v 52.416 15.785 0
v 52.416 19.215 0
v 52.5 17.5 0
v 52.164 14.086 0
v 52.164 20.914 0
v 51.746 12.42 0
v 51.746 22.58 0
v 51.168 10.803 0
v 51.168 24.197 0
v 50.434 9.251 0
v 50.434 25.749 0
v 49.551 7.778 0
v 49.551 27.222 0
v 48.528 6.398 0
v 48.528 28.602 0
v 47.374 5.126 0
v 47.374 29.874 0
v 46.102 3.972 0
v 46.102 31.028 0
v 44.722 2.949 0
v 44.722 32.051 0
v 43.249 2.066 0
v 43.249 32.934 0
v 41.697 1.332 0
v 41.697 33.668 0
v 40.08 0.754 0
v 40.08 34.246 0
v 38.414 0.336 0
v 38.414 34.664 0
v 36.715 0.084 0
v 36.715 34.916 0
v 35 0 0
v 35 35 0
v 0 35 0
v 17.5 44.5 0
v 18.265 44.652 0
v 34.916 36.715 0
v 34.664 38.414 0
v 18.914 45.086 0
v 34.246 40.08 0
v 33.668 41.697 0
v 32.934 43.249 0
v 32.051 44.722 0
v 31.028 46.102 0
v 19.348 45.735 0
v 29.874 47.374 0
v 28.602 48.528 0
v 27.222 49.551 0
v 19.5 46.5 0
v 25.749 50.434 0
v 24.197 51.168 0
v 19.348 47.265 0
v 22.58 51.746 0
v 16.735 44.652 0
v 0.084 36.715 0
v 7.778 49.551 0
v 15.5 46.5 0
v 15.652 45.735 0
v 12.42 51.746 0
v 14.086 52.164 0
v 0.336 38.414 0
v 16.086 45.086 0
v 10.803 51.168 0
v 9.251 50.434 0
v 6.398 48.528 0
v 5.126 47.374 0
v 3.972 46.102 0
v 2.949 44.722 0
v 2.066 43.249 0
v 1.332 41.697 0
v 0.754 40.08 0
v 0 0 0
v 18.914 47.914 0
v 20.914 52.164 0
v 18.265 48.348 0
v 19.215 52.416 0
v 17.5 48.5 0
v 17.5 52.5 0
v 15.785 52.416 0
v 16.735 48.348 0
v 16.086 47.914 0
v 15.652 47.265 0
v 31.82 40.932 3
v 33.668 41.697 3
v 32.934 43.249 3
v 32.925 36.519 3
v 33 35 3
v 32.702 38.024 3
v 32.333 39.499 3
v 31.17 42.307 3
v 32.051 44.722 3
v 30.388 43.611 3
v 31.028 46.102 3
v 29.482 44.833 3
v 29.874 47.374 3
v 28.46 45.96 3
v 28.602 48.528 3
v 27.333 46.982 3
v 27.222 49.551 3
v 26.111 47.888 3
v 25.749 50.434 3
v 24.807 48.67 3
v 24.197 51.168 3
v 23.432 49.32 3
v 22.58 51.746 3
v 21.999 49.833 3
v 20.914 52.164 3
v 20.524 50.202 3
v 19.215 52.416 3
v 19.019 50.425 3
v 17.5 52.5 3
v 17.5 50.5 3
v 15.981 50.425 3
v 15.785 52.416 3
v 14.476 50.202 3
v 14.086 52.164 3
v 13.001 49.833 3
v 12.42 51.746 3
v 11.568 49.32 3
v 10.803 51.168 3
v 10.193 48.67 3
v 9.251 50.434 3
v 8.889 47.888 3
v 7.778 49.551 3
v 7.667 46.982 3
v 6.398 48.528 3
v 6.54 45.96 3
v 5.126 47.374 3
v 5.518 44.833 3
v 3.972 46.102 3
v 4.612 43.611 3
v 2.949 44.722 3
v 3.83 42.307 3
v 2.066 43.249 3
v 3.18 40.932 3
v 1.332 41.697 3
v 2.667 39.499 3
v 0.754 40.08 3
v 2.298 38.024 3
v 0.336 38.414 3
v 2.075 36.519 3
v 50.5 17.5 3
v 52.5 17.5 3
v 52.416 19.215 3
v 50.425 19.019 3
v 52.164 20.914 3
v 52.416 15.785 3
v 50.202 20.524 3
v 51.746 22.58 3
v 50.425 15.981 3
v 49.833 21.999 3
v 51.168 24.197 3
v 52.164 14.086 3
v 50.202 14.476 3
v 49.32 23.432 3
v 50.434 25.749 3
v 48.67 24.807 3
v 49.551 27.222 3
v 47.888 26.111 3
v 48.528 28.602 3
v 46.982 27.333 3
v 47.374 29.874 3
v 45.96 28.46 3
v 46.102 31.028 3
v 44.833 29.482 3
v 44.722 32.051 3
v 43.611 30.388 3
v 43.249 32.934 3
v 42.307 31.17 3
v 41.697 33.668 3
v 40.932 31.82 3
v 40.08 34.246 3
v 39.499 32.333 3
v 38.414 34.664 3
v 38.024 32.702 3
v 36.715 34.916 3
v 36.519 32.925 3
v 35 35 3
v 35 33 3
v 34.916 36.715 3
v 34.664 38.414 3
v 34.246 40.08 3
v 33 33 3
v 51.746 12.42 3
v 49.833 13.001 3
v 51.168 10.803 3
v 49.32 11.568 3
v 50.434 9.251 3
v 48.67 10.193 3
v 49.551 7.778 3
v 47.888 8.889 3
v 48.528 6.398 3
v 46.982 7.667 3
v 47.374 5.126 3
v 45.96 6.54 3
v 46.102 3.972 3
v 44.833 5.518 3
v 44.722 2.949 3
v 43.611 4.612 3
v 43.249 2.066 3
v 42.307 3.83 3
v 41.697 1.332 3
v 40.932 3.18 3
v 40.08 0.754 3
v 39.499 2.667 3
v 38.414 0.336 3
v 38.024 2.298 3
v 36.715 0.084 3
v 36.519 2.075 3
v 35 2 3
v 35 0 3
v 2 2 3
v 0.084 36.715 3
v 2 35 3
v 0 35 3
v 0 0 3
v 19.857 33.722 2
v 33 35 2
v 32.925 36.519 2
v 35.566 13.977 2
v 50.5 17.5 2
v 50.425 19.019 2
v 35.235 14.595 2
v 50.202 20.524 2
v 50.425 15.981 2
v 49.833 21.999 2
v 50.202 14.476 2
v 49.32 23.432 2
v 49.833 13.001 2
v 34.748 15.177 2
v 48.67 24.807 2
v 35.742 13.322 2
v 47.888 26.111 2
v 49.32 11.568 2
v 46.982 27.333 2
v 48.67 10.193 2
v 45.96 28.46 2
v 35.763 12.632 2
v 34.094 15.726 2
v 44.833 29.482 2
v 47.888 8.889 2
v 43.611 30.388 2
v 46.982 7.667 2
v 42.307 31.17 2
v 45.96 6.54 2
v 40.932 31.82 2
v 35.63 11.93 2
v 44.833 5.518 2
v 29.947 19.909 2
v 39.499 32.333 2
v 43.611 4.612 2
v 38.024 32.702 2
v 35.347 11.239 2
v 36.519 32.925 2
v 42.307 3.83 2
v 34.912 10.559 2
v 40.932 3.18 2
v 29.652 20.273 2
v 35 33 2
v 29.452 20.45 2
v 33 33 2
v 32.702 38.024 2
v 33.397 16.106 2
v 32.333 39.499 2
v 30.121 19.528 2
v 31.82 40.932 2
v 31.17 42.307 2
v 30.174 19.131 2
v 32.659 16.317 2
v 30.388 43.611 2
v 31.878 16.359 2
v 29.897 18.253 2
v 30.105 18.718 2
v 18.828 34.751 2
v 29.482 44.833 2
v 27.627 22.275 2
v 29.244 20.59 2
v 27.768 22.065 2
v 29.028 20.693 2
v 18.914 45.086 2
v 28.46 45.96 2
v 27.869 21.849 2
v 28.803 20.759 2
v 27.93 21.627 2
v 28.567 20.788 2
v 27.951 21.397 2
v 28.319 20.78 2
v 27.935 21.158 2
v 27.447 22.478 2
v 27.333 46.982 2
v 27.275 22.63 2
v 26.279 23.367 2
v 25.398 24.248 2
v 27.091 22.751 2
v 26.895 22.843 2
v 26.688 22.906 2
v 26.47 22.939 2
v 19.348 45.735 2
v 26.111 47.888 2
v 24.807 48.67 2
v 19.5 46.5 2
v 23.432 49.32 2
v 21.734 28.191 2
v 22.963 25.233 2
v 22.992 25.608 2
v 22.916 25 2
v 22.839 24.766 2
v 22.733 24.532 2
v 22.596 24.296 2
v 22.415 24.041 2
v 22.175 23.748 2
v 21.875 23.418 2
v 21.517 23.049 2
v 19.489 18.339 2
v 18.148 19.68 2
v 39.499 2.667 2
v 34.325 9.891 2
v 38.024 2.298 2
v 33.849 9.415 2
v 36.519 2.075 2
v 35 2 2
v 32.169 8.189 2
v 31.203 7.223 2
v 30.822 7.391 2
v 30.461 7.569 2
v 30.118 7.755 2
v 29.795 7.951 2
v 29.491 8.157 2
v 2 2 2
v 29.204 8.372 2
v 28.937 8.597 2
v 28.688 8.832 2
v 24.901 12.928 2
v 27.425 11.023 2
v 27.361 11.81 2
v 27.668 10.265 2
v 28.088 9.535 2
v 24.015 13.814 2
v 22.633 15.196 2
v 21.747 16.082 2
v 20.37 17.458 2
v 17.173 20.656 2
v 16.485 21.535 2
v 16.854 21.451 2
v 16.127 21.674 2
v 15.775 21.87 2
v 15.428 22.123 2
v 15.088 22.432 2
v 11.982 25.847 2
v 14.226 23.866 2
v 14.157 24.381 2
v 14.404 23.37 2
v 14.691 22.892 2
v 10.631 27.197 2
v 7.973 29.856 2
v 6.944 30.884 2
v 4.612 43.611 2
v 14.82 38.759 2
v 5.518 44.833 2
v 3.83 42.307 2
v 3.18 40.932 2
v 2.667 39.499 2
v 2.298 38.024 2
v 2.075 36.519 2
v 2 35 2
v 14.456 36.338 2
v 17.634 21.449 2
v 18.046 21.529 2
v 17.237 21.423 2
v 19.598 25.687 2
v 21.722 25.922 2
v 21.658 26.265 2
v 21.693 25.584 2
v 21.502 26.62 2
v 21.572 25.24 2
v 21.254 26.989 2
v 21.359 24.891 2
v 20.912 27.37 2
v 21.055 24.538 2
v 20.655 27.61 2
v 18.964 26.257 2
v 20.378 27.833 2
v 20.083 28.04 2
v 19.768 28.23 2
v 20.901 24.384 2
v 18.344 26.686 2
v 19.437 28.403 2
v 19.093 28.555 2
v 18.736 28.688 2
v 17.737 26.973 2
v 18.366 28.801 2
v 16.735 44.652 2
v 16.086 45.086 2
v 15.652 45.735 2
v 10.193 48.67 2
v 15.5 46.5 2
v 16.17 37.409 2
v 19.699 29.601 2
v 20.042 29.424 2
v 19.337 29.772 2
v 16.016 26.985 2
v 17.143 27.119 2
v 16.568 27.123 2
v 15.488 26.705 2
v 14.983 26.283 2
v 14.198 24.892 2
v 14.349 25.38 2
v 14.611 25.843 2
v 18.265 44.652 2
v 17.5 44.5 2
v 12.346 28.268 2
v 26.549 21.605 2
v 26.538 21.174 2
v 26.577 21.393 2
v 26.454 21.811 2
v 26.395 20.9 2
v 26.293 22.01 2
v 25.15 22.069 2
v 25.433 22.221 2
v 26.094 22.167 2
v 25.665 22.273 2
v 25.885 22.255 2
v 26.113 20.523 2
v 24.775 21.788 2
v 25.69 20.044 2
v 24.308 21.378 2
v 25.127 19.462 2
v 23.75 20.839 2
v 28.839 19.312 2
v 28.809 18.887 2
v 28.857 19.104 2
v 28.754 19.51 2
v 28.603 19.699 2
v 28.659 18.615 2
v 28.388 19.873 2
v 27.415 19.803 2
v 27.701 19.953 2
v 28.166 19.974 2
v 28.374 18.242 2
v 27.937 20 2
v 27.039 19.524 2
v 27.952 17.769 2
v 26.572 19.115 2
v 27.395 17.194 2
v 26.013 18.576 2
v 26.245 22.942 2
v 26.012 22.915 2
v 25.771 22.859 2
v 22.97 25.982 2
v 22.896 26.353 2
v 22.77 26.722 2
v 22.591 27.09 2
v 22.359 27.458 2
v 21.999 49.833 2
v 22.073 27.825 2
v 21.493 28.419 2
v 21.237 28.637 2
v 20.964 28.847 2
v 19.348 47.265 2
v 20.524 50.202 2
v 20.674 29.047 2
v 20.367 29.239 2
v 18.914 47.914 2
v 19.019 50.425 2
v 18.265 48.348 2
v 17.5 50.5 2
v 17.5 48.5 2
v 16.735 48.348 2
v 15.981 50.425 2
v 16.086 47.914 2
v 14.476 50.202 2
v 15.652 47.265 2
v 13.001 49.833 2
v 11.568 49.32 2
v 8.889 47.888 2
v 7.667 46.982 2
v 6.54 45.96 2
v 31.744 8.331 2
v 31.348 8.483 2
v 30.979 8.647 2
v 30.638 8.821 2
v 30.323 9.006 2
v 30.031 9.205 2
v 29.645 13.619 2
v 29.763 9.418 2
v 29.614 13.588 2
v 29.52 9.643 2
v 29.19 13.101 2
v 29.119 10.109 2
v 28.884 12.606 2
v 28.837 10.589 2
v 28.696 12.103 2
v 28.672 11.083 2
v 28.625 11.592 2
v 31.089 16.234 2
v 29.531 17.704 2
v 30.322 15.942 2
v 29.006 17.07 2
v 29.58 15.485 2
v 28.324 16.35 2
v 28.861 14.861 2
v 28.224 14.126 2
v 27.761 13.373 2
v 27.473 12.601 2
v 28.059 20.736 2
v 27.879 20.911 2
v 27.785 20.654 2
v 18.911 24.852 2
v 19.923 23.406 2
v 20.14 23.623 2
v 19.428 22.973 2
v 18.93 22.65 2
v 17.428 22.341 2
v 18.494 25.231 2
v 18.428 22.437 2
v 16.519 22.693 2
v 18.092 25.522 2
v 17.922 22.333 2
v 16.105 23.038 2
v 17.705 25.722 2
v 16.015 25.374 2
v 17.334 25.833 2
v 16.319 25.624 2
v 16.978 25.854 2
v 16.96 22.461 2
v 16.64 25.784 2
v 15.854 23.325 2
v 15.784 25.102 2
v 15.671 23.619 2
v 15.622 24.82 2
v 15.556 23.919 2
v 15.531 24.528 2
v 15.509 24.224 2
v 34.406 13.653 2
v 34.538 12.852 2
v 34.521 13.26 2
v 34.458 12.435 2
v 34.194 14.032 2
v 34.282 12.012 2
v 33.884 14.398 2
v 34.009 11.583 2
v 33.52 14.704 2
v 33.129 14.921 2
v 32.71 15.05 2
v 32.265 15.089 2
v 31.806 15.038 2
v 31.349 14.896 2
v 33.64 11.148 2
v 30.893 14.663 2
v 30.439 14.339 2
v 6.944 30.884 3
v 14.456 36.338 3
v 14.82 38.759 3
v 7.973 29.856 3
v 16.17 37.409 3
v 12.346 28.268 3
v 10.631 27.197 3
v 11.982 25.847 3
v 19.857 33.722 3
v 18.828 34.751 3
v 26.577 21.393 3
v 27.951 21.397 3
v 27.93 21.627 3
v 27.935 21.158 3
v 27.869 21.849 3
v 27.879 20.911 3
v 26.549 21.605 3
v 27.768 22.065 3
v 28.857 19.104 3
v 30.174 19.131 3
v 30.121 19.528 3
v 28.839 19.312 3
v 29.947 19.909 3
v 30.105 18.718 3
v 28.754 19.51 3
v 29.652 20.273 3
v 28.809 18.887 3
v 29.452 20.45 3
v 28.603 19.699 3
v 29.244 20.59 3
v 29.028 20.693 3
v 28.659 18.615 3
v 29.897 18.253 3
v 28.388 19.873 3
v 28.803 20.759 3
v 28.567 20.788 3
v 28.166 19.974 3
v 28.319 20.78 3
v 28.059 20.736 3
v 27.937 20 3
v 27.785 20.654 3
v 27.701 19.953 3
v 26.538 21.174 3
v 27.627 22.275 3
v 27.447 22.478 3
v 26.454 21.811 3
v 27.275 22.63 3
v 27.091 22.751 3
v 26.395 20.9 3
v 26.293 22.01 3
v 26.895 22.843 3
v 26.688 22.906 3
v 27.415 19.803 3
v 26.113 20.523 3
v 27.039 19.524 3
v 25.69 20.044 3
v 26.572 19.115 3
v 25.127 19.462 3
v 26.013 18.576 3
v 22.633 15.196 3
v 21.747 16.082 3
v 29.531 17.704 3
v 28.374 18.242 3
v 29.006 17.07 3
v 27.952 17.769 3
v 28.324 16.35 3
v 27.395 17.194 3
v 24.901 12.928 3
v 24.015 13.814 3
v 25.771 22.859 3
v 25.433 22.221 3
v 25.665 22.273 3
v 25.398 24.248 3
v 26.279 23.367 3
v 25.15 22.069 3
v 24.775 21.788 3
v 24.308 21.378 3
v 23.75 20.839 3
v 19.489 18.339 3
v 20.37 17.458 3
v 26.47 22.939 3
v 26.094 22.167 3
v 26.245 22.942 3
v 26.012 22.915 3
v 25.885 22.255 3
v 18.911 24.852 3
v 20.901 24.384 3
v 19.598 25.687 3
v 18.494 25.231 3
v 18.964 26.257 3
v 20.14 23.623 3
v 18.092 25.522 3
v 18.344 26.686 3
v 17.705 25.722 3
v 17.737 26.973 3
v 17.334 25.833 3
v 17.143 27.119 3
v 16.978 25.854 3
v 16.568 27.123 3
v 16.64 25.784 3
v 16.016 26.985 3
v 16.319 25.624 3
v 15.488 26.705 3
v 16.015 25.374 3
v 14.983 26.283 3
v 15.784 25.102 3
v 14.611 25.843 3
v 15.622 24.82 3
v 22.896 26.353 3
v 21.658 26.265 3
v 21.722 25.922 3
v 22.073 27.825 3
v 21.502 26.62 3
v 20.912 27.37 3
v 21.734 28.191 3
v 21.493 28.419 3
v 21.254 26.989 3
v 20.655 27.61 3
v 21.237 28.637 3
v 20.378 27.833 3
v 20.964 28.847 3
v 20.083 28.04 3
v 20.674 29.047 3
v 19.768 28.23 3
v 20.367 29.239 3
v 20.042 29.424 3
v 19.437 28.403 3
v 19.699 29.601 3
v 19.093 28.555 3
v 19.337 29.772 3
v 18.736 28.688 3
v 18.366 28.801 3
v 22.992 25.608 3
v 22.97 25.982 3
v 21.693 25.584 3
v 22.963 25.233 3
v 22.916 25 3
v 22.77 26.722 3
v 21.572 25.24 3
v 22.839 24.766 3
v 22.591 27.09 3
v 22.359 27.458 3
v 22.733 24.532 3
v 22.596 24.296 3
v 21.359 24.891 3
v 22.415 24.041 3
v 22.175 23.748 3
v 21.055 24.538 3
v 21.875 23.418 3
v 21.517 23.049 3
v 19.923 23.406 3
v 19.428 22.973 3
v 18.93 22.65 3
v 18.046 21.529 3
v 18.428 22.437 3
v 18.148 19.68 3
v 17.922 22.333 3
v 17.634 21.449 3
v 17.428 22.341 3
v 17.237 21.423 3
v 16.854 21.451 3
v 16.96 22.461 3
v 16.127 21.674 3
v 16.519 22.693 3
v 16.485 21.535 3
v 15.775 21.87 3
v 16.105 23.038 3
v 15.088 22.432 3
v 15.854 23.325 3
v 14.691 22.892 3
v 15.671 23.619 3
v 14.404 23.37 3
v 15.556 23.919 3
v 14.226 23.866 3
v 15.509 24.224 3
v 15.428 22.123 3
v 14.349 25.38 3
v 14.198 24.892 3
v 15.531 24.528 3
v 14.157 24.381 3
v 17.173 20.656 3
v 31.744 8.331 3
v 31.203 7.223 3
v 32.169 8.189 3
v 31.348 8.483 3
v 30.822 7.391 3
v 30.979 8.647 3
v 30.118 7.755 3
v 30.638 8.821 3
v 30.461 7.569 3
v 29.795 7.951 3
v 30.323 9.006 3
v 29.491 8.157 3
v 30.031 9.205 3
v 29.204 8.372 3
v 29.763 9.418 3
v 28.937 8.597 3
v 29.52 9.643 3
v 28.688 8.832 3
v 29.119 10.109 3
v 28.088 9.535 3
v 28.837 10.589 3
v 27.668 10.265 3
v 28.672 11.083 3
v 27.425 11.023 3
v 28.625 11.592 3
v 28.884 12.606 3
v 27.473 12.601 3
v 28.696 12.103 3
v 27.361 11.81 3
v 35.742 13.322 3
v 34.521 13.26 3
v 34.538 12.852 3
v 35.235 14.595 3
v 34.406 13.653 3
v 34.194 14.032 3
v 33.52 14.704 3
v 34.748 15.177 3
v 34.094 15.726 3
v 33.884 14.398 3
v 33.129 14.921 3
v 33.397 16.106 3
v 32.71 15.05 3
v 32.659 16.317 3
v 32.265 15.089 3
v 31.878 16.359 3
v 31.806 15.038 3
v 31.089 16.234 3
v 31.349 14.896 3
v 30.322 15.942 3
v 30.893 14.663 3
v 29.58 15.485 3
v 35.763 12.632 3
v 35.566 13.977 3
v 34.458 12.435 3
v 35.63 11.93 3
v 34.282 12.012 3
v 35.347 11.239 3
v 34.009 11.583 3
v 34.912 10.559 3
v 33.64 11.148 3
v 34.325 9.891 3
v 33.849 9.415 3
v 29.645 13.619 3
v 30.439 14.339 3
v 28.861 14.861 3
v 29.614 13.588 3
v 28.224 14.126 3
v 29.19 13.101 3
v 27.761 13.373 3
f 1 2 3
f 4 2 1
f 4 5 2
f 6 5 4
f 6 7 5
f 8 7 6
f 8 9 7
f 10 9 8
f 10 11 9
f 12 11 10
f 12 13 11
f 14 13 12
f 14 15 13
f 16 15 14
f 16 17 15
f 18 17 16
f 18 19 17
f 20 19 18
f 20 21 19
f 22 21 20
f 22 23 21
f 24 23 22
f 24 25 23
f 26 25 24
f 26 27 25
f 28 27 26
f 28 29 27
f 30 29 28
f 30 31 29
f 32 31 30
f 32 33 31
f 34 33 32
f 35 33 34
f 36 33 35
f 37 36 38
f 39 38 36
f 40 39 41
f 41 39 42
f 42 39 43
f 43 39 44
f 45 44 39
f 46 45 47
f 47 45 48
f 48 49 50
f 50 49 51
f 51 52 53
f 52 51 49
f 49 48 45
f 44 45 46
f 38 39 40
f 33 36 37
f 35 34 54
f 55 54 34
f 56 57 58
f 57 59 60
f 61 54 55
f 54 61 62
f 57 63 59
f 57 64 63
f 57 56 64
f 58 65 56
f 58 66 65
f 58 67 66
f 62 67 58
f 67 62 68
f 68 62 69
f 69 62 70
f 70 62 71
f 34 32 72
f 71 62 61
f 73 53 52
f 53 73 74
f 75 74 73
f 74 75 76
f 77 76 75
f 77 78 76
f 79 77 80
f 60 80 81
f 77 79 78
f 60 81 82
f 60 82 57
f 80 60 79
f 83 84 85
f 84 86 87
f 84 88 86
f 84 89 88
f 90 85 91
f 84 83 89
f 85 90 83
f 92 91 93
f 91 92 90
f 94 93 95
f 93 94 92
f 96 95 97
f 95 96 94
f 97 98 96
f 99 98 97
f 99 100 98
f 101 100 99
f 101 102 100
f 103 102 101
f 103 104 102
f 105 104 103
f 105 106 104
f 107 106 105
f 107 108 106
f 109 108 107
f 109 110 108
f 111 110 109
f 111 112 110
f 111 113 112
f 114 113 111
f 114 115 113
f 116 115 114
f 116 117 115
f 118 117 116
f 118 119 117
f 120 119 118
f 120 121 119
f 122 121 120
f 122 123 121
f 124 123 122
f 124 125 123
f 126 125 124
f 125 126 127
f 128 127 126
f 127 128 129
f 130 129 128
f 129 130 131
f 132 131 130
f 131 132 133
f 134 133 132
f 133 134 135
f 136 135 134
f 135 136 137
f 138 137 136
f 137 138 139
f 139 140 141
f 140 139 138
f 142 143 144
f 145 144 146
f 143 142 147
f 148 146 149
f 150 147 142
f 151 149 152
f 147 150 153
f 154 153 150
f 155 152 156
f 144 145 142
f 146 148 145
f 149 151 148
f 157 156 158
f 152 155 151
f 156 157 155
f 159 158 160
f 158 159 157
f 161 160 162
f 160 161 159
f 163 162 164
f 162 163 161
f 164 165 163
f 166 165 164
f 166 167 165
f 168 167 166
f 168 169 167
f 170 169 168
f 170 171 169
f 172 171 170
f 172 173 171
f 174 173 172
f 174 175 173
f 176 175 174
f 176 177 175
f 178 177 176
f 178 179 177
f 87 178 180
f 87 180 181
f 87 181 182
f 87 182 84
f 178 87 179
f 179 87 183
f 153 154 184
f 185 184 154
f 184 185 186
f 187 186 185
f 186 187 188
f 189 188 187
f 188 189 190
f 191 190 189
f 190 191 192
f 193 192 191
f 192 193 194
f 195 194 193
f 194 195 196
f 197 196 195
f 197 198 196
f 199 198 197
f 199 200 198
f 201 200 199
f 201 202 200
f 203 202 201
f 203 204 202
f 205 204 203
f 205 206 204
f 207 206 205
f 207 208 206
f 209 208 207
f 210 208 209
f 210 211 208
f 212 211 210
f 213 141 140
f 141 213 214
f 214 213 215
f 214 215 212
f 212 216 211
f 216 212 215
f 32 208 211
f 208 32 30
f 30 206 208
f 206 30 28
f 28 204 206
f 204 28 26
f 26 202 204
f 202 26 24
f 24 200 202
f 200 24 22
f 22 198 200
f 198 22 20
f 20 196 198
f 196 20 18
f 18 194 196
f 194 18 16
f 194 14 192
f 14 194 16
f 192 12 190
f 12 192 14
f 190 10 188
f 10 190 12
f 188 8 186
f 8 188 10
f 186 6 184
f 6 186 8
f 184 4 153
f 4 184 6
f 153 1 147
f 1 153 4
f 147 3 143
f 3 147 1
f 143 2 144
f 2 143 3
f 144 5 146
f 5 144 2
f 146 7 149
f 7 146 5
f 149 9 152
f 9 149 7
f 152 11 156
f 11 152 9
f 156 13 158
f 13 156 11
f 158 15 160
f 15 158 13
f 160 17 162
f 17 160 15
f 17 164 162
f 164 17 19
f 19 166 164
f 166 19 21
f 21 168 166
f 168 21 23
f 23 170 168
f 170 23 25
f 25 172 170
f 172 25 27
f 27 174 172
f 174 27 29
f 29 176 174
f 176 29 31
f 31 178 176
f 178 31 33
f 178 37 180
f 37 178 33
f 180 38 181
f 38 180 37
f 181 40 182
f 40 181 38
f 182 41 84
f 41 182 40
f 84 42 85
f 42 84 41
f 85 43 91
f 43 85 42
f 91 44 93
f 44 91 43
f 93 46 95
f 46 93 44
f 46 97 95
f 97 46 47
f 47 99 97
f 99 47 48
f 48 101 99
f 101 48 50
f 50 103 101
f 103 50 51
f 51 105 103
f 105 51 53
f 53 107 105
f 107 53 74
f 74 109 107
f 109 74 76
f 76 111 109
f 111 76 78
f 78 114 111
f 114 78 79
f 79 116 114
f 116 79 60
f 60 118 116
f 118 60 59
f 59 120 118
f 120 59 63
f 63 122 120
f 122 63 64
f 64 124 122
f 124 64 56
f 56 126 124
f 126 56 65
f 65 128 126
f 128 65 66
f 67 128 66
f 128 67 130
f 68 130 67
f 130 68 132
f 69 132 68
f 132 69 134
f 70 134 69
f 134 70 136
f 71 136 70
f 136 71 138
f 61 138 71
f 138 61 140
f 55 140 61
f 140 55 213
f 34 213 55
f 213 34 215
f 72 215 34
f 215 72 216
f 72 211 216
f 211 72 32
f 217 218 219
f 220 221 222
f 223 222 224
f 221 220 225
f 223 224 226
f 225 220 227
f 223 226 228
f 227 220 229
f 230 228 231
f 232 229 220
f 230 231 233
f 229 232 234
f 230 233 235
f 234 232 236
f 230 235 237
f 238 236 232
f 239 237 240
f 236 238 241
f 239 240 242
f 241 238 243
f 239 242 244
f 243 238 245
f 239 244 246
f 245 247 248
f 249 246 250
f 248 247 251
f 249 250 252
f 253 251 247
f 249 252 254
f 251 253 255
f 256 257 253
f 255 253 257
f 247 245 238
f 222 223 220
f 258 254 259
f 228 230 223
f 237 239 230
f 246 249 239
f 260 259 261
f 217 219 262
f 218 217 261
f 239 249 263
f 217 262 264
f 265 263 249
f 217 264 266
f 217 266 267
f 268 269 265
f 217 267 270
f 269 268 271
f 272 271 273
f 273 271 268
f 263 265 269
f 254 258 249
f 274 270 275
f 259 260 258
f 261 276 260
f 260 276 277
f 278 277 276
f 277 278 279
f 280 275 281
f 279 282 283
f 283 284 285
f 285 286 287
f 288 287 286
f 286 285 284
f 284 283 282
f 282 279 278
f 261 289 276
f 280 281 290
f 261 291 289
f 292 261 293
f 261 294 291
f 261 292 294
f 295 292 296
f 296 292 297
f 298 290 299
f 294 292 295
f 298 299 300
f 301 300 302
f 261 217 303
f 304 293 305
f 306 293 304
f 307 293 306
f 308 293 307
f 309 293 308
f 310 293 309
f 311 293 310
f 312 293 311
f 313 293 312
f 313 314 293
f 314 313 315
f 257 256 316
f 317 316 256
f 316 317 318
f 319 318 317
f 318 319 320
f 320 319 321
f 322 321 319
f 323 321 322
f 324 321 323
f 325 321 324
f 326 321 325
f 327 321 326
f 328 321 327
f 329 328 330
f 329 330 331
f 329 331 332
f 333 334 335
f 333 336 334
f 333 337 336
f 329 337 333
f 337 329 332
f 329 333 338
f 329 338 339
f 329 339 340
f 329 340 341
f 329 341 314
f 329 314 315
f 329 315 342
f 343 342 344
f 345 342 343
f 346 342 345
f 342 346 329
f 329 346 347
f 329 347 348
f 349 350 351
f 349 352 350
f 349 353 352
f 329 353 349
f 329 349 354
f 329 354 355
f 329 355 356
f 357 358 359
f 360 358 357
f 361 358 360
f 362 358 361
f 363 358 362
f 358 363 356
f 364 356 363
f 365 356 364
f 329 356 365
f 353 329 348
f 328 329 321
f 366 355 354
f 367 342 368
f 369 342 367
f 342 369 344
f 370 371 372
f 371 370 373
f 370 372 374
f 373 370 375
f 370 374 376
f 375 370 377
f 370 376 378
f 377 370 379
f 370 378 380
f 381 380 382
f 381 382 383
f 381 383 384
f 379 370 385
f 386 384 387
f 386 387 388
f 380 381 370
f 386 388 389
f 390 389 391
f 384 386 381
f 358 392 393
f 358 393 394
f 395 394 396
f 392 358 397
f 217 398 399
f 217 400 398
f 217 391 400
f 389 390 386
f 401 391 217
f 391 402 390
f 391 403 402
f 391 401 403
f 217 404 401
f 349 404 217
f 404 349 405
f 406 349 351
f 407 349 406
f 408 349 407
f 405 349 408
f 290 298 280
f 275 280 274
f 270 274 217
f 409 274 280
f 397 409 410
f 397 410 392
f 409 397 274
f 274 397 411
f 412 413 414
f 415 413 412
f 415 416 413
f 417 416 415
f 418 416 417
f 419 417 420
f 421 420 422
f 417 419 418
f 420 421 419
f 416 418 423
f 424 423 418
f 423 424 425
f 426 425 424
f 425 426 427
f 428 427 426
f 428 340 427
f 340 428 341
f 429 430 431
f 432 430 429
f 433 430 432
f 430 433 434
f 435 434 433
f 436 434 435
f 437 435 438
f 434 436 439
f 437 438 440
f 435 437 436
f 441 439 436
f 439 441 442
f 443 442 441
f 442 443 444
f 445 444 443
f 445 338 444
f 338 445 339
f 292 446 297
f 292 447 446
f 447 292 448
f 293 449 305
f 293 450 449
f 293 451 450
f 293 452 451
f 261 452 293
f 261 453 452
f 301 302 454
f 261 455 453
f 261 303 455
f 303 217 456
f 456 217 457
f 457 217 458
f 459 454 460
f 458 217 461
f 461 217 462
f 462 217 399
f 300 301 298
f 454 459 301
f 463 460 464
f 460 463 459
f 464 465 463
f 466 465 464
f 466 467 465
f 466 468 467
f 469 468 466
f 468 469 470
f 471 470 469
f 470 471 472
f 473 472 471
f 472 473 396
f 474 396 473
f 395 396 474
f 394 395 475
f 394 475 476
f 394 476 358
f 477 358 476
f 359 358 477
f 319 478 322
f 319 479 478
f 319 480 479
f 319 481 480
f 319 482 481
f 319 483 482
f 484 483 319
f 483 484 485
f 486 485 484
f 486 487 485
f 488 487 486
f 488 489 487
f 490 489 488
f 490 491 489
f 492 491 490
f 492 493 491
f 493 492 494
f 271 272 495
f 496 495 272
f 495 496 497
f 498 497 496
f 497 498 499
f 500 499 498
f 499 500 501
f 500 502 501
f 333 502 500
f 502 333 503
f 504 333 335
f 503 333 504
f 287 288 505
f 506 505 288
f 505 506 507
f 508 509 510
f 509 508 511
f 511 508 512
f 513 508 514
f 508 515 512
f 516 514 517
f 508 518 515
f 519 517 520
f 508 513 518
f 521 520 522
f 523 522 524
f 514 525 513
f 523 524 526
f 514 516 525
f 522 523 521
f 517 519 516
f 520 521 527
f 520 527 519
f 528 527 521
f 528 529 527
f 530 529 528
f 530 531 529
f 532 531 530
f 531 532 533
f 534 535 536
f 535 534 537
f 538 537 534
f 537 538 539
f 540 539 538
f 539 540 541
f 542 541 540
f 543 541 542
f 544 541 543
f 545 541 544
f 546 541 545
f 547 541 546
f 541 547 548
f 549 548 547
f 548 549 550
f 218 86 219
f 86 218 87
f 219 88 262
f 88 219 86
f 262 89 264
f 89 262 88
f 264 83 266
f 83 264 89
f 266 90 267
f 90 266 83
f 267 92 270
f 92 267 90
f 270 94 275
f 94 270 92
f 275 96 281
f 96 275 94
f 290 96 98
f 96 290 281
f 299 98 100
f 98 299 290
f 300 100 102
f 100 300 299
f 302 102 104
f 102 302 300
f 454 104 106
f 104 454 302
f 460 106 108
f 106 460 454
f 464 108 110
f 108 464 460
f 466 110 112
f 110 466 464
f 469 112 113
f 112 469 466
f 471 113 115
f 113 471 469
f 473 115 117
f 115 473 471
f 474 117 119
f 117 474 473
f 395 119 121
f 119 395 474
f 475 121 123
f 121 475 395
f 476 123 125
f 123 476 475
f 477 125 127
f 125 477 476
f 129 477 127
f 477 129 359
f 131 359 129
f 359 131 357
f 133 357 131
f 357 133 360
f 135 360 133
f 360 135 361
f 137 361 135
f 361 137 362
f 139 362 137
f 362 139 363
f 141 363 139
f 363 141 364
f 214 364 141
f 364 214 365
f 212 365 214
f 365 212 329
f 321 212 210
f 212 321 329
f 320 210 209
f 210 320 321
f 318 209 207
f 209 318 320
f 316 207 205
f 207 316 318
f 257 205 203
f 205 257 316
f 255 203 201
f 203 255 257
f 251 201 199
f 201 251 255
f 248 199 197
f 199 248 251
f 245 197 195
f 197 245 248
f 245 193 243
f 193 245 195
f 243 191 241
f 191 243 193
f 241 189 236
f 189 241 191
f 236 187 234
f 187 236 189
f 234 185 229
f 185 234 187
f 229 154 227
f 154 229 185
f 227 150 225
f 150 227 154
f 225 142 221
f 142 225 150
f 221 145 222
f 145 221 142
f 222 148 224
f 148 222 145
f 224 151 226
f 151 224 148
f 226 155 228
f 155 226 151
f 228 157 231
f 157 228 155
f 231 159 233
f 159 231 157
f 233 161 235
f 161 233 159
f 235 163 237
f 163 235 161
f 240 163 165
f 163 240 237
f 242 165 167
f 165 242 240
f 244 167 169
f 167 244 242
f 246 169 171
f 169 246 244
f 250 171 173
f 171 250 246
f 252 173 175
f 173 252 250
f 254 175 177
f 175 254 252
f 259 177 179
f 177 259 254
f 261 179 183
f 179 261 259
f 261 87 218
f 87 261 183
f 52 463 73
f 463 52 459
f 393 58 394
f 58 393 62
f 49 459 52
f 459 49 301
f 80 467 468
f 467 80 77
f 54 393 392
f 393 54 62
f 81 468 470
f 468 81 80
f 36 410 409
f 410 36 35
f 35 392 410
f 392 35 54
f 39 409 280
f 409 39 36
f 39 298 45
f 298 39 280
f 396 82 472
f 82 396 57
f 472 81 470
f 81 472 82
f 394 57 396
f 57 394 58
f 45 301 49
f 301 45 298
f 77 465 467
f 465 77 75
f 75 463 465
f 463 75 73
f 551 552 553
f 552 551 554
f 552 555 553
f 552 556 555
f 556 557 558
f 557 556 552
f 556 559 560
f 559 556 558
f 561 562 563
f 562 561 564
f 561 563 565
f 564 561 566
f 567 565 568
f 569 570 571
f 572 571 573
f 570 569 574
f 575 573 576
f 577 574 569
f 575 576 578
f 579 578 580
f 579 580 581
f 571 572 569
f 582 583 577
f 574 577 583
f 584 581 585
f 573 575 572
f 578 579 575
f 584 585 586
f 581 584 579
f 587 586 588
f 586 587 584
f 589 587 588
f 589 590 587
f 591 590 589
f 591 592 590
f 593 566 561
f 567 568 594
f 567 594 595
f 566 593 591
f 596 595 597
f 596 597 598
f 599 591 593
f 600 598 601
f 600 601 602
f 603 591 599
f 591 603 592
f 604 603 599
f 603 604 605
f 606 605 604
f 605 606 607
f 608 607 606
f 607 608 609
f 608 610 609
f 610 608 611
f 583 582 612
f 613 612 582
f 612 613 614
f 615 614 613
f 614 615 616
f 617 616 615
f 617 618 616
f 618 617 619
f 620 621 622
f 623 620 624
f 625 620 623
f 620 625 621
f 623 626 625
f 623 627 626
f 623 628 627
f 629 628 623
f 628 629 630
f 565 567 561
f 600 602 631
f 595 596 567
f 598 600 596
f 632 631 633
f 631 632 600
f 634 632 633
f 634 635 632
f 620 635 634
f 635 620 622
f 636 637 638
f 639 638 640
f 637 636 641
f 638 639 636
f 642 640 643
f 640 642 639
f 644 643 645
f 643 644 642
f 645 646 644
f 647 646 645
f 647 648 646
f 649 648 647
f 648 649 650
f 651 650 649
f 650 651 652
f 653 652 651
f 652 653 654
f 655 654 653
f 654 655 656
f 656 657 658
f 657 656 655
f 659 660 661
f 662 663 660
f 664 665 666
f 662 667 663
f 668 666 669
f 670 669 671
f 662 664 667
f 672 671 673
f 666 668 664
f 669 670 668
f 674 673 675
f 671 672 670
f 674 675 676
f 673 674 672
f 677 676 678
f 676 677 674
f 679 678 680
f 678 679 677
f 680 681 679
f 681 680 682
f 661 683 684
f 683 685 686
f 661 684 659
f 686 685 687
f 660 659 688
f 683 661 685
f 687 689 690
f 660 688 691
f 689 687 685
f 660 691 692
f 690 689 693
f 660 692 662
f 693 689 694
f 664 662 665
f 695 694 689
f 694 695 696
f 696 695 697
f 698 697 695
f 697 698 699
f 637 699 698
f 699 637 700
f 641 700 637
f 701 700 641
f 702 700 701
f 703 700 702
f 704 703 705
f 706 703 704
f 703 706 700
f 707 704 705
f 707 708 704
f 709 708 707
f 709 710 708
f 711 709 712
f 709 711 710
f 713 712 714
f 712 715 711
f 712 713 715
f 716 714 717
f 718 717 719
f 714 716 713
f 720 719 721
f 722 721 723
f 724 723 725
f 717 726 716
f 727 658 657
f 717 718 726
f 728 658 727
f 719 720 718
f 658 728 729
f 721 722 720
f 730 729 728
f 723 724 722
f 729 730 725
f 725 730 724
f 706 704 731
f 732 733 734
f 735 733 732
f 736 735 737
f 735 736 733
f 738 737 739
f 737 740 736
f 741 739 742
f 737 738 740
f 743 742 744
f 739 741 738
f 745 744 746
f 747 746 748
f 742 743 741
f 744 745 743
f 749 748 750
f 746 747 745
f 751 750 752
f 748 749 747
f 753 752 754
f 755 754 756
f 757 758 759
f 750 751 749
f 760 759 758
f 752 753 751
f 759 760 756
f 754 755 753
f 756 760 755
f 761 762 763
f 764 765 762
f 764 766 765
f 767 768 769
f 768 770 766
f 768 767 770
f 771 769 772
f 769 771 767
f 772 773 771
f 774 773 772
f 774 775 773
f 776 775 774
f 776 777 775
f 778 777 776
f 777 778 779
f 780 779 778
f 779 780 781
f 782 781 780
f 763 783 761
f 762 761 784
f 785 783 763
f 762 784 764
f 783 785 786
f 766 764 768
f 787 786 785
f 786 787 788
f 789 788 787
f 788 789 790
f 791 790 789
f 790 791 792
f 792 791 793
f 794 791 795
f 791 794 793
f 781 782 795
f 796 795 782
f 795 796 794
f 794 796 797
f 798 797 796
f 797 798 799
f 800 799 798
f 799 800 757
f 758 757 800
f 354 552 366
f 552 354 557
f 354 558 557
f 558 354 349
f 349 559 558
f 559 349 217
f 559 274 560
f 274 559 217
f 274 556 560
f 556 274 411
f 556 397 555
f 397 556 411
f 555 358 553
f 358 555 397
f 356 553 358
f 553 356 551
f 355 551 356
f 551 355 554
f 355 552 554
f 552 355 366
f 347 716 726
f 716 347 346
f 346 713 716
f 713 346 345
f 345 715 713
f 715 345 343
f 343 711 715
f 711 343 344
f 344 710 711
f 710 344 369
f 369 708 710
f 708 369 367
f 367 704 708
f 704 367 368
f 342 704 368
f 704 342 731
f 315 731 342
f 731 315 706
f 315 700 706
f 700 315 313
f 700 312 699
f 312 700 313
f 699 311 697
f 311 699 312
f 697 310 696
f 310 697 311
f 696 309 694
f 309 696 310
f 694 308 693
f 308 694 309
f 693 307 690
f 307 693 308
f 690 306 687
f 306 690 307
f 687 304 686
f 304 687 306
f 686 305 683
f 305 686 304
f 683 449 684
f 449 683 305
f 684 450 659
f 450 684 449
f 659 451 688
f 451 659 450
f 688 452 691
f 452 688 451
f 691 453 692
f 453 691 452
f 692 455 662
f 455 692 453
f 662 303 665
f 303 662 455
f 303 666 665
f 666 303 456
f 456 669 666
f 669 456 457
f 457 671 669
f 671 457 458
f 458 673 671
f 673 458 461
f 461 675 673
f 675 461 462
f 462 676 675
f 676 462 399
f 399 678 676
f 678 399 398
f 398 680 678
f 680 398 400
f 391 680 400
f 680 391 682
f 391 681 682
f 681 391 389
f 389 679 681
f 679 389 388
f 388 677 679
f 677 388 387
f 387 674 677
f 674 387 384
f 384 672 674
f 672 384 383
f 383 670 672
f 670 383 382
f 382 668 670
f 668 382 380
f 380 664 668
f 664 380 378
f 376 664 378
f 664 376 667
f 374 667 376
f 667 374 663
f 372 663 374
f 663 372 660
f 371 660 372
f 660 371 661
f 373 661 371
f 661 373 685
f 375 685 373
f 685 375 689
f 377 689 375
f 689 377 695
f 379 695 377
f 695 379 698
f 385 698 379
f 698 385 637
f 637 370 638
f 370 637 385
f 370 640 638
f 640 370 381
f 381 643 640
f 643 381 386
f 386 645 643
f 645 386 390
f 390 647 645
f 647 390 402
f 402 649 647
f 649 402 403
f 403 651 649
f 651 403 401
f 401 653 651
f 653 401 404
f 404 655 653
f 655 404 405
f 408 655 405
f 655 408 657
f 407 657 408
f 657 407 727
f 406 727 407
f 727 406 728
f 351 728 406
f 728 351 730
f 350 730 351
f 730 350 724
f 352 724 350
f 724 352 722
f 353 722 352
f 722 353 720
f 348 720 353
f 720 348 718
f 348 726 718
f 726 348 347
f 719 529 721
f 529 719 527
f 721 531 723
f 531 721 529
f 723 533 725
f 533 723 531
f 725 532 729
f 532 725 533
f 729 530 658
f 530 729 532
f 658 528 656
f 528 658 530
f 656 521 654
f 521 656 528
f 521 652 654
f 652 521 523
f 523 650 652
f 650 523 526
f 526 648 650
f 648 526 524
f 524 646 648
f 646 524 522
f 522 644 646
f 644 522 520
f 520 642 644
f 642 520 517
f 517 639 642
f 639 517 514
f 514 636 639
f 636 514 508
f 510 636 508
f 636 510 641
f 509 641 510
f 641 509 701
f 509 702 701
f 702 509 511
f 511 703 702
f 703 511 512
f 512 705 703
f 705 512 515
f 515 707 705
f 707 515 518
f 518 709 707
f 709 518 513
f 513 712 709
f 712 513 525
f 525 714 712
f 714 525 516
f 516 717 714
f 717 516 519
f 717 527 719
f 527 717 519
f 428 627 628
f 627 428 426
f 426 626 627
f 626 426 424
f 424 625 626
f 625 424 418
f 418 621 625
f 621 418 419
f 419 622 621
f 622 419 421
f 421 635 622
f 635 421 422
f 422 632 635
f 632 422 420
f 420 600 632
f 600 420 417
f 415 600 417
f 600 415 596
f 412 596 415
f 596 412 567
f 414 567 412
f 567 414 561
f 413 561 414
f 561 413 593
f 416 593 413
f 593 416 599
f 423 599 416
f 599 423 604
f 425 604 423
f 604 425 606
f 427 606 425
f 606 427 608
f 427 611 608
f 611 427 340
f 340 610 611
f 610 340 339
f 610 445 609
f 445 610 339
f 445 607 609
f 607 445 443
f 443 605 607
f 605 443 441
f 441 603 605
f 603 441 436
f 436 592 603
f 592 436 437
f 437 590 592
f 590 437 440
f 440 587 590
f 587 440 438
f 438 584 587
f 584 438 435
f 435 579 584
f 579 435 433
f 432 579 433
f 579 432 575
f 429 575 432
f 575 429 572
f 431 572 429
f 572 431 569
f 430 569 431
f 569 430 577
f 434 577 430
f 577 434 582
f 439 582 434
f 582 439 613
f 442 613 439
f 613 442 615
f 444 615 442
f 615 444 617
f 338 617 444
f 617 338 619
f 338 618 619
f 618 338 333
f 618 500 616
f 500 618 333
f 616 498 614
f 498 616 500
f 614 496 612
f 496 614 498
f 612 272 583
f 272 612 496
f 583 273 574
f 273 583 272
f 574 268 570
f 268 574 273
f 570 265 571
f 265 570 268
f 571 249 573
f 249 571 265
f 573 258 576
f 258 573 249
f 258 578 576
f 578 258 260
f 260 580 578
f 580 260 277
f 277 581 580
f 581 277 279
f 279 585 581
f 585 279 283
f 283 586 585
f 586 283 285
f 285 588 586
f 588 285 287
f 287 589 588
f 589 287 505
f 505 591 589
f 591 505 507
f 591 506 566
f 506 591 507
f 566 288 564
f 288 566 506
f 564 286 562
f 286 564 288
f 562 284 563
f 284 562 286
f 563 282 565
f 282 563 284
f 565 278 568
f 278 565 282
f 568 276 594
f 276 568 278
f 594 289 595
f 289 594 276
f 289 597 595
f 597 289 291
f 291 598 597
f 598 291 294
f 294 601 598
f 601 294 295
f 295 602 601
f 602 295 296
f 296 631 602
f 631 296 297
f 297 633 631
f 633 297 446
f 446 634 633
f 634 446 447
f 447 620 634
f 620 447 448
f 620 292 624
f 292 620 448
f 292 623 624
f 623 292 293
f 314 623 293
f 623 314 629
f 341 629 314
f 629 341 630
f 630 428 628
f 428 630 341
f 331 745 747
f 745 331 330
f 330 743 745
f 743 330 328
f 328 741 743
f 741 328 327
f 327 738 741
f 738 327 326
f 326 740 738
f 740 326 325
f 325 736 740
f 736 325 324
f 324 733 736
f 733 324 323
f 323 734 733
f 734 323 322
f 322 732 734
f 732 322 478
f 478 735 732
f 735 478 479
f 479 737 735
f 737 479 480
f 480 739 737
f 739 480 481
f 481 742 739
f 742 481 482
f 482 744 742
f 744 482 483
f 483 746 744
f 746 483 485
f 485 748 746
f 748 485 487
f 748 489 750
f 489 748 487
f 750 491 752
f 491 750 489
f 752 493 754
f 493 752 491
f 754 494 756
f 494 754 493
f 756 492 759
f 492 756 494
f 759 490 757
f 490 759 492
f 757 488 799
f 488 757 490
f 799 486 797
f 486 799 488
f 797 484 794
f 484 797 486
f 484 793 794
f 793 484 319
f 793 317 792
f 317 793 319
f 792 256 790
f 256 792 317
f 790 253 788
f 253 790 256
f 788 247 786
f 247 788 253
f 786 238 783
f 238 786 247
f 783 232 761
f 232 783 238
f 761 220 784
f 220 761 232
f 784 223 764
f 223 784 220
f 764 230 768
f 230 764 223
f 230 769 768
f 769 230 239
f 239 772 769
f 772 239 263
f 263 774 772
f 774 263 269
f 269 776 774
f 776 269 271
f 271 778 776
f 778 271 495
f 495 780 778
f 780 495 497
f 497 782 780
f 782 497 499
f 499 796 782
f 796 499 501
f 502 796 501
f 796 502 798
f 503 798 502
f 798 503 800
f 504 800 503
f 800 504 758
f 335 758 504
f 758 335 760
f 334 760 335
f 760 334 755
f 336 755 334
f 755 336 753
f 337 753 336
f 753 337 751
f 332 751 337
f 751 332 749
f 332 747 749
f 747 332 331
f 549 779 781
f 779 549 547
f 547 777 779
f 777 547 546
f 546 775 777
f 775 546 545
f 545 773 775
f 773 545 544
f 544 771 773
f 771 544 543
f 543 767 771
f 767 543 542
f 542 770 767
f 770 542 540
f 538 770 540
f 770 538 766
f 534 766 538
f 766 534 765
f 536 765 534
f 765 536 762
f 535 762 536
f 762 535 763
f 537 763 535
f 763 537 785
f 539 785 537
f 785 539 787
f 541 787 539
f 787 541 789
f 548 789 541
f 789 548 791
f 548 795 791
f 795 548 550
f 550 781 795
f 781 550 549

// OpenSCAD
edgeLength = 35;
borderwidth = 2;

holeRadius = 2;

height = 3;
extrusionHeight = 1;

textSize = 11;
name = "Name";


union(){
    radius = edgeLength / 2;
    
    difference(){
        linear_extrude(height){
            square(edgeLength);
            
            $fn = 64;
            translate([radius, edgeLength, 0]){
                circle(radius);
            }

            translate([edgeLength, radius, 0]){
                circle(radius);  
            } 
        }
        
        cutoutSize = edgeLength - borderwidth;
        cutoutRadius = radius - borderwidth;
        
        translate([borderwidth, borderwidth, height - extrusionHeight]){
            linear_extrude(extrusionHeight + 0.1){
                
                
                square([cutoutSize, edgeLength - borderwidth * 2]);
                square([edgeLength - borderwidth * 2, cutoutSize]);
                
                $fn = 64;
                translate([cutoutRadius, cutoutSize, 0])
                    circle(cutoutRadius);
                translate([cutoutSize, cutoutRadius, 0])
                    circle(cutoutRadius);
            }
        }
        
        linear_extrude(height){
            translate([radius, (edgeLength - borderwidth * 2) * 1.5, 0])
                circle(holeRadius,$fn = 16); 
        }
    }
    
    linear_extrude(height){
        rotate([ 0, 0, -45]){
            translate([0, sqrt(2) * radius + borderwidth, height - extrusionHeight]){
                text(name, size = textSize, halign = "center", font = "Consolas:style=Bold Italic");
            }
        }
    }
}
